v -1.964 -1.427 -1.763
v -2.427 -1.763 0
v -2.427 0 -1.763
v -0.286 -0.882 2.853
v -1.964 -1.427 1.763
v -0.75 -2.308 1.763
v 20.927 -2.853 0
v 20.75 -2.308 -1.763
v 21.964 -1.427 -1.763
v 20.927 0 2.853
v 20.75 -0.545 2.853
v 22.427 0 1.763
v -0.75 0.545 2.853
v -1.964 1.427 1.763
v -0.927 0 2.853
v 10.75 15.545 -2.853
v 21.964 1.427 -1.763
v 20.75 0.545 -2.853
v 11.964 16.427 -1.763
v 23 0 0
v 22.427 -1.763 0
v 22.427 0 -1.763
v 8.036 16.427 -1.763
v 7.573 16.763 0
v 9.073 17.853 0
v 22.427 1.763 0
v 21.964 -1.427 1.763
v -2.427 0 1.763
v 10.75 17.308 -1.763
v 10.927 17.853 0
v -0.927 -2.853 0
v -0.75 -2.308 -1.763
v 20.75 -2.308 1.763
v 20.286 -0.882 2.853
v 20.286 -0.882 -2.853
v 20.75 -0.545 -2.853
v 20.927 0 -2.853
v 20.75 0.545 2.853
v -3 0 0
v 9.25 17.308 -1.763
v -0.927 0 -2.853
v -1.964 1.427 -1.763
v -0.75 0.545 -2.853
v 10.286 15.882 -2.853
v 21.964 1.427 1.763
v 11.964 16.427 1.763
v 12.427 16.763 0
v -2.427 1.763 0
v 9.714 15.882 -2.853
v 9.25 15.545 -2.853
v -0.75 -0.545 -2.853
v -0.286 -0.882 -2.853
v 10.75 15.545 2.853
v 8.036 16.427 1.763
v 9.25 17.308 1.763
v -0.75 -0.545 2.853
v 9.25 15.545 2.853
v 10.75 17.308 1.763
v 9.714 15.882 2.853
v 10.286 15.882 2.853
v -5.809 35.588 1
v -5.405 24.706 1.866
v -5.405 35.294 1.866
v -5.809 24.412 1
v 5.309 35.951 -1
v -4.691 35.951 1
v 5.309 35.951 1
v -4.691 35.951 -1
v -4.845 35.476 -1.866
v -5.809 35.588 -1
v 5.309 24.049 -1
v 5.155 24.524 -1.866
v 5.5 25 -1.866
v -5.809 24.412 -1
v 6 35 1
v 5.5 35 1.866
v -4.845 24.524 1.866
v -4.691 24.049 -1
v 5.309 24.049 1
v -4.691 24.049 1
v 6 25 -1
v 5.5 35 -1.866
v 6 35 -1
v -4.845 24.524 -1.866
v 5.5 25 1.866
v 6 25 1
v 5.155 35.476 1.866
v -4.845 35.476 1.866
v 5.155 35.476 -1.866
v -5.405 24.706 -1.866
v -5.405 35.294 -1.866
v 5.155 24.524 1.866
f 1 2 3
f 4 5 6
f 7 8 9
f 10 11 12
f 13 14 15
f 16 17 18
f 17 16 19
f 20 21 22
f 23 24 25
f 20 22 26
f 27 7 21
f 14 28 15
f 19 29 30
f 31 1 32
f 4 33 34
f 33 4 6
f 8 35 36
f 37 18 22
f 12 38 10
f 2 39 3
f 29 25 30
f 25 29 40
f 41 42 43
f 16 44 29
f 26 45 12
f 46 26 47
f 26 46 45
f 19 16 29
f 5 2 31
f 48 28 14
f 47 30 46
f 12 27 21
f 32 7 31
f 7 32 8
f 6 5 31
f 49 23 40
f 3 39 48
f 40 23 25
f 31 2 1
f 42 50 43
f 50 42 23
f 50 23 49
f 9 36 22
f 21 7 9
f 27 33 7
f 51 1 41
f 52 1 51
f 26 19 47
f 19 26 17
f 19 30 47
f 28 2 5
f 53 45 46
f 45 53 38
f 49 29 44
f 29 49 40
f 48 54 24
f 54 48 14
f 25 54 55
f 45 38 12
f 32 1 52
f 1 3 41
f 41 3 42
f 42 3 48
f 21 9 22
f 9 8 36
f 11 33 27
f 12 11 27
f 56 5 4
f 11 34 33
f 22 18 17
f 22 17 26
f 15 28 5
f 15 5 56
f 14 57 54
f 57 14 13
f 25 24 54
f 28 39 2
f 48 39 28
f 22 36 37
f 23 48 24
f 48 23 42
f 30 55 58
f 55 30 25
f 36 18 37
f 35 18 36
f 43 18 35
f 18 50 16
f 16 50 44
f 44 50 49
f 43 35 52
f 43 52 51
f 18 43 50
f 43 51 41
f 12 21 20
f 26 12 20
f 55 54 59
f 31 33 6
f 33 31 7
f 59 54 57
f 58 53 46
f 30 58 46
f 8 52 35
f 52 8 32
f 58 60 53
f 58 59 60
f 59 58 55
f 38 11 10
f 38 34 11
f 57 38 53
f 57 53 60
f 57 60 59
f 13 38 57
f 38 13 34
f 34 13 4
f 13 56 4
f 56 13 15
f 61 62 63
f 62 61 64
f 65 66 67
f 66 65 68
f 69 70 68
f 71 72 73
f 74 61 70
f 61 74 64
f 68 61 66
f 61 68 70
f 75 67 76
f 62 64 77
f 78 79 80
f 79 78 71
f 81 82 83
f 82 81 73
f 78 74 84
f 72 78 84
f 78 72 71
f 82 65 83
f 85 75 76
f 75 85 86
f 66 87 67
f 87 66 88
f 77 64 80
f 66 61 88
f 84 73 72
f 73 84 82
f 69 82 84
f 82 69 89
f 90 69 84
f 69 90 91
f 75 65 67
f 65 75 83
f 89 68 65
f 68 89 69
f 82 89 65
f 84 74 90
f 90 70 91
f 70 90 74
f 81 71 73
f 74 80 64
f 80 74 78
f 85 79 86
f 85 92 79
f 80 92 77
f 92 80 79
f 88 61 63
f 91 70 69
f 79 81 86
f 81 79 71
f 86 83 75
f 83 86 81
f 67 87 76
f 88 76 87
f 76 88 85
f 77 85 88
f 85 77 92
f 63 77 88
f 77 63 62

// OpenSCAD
// hull and minkowski
hull() {
    translate([0, 0, 0]) sphere(3);
    translate([20, 0, 0]) sphere(3);
    translate([10, 15, 0]) sphere(3);
}

translate([0, 30, 0])
minkowski() {
    cube([10, 10, 2], center = true);
    sphere(1);
}
